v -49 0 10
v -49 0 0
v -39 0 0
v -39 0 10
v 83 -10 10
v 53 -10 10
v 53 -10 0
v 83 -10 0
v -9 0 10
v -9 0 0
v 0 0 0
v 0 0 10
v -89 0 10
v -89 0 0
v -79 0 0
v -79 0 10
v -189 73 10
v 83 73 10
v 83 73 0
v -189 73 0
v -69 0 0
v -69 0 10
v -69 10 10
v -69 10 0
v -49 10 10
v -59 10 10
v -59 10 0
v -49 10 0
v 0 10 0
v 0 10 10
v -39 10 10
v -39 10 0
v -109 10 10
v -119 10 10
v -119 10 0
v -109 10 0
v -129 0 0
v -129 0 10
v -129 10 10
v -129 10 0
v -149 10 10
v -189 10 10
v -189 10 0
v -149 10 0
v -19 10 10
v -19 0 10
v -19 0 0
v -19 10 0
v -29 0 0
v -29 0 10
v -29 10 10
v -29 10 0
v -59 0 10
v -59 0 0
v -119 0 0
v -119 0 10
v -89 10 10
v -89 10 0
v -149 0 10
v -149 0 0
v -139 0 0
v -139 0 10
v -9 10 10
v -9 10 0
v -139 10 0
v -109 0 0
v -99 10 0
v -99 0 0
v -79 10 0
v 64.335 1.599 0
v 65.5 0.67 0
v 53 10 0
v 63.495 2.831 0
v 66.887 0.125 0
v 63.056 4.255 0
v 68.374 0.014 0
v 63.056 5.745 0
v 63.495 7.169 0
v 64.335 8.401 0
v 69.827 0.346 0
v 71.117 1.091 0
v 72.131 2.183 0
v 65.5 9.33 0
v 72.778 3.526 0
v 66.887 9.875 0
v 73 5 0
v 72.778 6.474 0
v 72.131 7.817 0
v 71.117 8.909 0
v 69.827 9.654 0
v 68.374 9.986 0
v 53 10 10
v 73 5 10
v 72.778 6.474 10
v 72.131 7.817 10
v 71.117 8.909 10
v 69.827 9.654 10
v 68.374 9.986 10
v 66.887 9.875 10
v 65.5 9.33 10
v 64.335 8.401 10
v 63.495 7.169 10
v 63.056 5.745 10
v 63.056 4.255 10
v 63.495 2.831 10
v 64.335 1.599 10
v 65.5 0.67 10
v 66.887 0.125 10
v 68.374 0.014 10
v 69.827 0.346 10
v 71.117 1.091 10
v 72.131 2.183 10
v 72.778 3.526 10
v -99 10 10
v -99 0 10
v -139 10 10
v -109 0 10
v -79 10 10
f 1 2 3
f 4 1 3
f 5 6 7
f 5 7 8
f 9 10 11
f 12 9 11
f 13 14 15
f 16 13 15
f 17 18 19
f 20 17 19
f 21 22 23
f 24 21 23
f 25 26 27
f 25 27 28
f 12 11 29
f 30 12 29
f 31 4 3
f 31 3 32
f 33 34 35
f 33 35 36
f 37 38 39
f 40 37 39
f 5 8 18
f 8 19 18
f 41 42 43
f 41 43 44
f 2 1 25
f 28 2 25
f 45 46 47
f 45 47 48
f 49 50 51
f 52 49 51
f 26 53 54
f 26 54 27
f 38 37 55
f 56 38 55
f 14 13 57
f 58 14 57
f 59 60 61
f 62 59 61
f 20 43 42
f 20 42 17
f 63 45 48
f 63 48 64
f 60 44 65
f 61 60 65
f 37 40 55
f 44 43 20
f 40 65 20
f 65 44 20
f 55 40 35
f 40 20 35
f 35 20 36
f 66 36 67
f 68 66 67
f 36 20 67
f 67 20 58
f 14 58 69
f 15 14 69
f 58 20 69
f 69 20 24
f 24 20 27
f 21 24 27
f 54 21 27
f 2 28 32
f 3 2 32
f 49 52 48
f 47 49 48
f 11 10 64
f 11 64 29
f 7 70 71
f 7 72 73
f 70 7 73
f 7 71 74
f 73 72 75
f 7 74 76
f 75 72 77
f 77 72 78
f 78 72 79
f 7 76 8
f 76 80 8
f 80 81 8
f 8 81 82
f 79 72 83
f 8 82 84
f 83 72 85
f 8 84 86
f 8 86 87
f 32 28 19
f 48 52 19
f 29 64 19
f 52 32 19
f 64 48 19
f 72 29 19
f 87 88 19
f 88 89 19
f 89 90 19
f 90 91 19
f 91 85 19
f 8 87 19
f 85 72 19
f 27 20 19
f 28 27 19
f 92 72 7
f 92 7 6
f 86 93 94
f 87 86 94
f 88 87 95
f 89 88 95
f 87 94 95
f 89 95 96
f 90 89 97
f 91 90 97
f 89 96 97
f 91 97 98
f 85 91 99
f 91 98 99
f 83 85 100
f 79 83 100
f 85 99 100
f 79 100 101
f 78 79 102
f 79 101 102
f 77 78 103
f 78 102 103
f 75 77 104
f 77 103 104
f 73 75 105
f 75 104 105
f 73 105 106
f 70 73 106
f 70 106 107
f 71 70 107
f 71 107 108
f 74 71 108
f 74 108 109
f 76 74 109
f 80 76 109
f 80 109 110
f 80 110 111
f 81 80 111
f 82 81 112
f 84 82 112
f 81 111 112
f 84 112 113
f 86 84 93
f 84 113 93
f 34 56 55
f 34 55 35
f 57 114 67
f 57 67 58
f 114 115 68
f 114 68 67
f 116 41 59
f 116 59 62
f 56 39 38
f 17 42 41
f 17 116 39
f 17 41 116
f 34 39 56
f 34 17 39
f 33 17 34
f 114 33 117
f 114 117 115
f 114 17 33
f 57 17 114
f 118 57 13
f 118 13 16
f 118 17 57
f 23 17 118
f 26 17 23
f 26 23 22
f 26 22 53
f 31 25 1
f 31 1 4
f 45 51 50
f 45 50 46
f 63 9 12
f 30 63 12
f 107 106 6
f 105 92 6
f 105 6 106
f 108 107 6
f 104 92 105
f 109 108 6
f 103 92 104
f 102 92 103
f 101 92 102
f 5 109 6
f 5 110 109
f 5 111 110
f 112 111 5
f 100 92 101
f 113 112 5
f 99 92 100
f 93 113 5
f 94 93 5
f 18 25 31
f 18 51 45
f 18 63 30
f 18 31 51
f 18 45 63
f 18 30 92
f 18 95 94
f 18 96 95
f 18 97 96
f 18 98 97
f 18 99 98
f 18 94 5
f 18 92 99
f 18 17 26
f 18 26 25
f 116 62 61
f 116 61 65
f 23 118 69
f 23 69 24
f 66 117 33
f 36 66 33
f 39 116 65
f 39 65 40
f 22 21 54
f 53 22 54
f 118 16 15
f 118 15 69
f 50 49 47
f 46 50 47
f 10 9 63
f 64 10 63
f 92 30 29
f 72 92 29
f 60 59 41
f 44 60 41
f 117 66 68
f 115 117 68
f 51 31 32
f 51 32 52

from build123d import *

# Parameters (mm, degrees)
ESQUISSE1_W                = 189
ESQUISSE1_H                = 73
BOSS_EXTRU_1_DEPTH         = 10
ESQUISSE2_W                = 10
ESQUISSE2_H                = 10
ENL_V_MAT_EXTRU_2_DEPTH    = 10
R_P_TITION_LIN_AIRE2_COUNT = 8
R_P_TITION_LIN_AIRE2_PITCH = 20
ESQUISSE3_W                = 30
ESQUISSE3_H                = 10
ENL_V_MAT_EXTRU_3_DEPTH    = 10
ESQUISSE4_W                = 10
ESQUISSE4_H                = 63
BOSS_EXTRU_2_DEPTH         = 83
ESQUISSE5_W                = 30
ESQUISSE5_H                = 10
BOSS_EXTRU_3_DEPTH         = 20
ESQUISSE6_R                = 5
ENL_V_MAT_EXTRU_4_DEPTH    = 10


with BuildPart() as part:
    # Esquisse1 → Boss.-Extru.1 (new body)
    with BuildSketch(Plane.XY):
        with Locations((-94.5, 36.5)):
            Rectangle(ESQUISSE1_W, ESQUISSE1_H)
    extrude(amount=BOSS_EXTRU_1_DEPTH)

    # Esquisse2 → Enlèv. mat.-Extru.2 (cut)
    with BuildSketch(Plane.XY.offset(10)):
        with Locations((-154, 5)):
            Rectangle(ESQUISSE2_W, ESQUISSE2_H)
    enl_v_mat_extru_2 = extrude(amount=-ENL_V_MAT_EXTRU_2_DEPTH, mode=Mode.SUBTRACT)

    # Répétition linéaire2: Enlèv. mat.-Extru.2 ×8
    with Locations(*[(i * R_P_TITION_LIN_AIRE2_PITCH, 0, 0) for i in range(1, R_P_TITION_LIN_AIRE2_COUNT)]):
        add(enl_v_mat_extru_2, mode=Mode.SUBTRACT)

    # Esquisse3 → Enlèv. mat.-Extru.3 (cut)
    with BuildSketch(Plane.XY.offset(10)):
        with Locations((-174, 5)):
            Rectangle(ESQUISSE3_W, ESQUISSE3_H)
    extrude(amount=-ENL_V_MAT_EXTRU_3_DEPTH, mode=Mode.SUBTRACT)

    # Esquisse4 → Boss.-Extru.2 (add)
    with BuildSketch(Plane(origin=(0, 0, 0), x_dir=(0, 0, -1), z_dir=(1, 0, 0))):
        with Locations((-5, 41.5)):
            Rectangle(ESQUISSE4_W, ESQUISSE4_H)
    extrude(amount=BOSS_EXTRU_2_DEPTH)

    # Esquisse5 → Boss.-Extru.3 (add)
    with BuildSketch(Plane.XZ.offset(-10)):
        with Locations((68, 5)):
            Rectangle(ESQUISSE5_W, ESQUISSE5_H)
    extrude(amount=BOSS_EXTRU_3_DEPTH)

    # Esquisse6 → Enlèv. mat.-Extru.4 (cut)
    with BuildSketch(Plane.XY.offset(10)):
        with Locations((68, 5)):
            Circle(ESQUISSE6_R)
    extrude(amount=-ENL_V_MAT_EXTRU_4_DEPTH, mode=Mode.SUBTRACT)


solid = part.part
